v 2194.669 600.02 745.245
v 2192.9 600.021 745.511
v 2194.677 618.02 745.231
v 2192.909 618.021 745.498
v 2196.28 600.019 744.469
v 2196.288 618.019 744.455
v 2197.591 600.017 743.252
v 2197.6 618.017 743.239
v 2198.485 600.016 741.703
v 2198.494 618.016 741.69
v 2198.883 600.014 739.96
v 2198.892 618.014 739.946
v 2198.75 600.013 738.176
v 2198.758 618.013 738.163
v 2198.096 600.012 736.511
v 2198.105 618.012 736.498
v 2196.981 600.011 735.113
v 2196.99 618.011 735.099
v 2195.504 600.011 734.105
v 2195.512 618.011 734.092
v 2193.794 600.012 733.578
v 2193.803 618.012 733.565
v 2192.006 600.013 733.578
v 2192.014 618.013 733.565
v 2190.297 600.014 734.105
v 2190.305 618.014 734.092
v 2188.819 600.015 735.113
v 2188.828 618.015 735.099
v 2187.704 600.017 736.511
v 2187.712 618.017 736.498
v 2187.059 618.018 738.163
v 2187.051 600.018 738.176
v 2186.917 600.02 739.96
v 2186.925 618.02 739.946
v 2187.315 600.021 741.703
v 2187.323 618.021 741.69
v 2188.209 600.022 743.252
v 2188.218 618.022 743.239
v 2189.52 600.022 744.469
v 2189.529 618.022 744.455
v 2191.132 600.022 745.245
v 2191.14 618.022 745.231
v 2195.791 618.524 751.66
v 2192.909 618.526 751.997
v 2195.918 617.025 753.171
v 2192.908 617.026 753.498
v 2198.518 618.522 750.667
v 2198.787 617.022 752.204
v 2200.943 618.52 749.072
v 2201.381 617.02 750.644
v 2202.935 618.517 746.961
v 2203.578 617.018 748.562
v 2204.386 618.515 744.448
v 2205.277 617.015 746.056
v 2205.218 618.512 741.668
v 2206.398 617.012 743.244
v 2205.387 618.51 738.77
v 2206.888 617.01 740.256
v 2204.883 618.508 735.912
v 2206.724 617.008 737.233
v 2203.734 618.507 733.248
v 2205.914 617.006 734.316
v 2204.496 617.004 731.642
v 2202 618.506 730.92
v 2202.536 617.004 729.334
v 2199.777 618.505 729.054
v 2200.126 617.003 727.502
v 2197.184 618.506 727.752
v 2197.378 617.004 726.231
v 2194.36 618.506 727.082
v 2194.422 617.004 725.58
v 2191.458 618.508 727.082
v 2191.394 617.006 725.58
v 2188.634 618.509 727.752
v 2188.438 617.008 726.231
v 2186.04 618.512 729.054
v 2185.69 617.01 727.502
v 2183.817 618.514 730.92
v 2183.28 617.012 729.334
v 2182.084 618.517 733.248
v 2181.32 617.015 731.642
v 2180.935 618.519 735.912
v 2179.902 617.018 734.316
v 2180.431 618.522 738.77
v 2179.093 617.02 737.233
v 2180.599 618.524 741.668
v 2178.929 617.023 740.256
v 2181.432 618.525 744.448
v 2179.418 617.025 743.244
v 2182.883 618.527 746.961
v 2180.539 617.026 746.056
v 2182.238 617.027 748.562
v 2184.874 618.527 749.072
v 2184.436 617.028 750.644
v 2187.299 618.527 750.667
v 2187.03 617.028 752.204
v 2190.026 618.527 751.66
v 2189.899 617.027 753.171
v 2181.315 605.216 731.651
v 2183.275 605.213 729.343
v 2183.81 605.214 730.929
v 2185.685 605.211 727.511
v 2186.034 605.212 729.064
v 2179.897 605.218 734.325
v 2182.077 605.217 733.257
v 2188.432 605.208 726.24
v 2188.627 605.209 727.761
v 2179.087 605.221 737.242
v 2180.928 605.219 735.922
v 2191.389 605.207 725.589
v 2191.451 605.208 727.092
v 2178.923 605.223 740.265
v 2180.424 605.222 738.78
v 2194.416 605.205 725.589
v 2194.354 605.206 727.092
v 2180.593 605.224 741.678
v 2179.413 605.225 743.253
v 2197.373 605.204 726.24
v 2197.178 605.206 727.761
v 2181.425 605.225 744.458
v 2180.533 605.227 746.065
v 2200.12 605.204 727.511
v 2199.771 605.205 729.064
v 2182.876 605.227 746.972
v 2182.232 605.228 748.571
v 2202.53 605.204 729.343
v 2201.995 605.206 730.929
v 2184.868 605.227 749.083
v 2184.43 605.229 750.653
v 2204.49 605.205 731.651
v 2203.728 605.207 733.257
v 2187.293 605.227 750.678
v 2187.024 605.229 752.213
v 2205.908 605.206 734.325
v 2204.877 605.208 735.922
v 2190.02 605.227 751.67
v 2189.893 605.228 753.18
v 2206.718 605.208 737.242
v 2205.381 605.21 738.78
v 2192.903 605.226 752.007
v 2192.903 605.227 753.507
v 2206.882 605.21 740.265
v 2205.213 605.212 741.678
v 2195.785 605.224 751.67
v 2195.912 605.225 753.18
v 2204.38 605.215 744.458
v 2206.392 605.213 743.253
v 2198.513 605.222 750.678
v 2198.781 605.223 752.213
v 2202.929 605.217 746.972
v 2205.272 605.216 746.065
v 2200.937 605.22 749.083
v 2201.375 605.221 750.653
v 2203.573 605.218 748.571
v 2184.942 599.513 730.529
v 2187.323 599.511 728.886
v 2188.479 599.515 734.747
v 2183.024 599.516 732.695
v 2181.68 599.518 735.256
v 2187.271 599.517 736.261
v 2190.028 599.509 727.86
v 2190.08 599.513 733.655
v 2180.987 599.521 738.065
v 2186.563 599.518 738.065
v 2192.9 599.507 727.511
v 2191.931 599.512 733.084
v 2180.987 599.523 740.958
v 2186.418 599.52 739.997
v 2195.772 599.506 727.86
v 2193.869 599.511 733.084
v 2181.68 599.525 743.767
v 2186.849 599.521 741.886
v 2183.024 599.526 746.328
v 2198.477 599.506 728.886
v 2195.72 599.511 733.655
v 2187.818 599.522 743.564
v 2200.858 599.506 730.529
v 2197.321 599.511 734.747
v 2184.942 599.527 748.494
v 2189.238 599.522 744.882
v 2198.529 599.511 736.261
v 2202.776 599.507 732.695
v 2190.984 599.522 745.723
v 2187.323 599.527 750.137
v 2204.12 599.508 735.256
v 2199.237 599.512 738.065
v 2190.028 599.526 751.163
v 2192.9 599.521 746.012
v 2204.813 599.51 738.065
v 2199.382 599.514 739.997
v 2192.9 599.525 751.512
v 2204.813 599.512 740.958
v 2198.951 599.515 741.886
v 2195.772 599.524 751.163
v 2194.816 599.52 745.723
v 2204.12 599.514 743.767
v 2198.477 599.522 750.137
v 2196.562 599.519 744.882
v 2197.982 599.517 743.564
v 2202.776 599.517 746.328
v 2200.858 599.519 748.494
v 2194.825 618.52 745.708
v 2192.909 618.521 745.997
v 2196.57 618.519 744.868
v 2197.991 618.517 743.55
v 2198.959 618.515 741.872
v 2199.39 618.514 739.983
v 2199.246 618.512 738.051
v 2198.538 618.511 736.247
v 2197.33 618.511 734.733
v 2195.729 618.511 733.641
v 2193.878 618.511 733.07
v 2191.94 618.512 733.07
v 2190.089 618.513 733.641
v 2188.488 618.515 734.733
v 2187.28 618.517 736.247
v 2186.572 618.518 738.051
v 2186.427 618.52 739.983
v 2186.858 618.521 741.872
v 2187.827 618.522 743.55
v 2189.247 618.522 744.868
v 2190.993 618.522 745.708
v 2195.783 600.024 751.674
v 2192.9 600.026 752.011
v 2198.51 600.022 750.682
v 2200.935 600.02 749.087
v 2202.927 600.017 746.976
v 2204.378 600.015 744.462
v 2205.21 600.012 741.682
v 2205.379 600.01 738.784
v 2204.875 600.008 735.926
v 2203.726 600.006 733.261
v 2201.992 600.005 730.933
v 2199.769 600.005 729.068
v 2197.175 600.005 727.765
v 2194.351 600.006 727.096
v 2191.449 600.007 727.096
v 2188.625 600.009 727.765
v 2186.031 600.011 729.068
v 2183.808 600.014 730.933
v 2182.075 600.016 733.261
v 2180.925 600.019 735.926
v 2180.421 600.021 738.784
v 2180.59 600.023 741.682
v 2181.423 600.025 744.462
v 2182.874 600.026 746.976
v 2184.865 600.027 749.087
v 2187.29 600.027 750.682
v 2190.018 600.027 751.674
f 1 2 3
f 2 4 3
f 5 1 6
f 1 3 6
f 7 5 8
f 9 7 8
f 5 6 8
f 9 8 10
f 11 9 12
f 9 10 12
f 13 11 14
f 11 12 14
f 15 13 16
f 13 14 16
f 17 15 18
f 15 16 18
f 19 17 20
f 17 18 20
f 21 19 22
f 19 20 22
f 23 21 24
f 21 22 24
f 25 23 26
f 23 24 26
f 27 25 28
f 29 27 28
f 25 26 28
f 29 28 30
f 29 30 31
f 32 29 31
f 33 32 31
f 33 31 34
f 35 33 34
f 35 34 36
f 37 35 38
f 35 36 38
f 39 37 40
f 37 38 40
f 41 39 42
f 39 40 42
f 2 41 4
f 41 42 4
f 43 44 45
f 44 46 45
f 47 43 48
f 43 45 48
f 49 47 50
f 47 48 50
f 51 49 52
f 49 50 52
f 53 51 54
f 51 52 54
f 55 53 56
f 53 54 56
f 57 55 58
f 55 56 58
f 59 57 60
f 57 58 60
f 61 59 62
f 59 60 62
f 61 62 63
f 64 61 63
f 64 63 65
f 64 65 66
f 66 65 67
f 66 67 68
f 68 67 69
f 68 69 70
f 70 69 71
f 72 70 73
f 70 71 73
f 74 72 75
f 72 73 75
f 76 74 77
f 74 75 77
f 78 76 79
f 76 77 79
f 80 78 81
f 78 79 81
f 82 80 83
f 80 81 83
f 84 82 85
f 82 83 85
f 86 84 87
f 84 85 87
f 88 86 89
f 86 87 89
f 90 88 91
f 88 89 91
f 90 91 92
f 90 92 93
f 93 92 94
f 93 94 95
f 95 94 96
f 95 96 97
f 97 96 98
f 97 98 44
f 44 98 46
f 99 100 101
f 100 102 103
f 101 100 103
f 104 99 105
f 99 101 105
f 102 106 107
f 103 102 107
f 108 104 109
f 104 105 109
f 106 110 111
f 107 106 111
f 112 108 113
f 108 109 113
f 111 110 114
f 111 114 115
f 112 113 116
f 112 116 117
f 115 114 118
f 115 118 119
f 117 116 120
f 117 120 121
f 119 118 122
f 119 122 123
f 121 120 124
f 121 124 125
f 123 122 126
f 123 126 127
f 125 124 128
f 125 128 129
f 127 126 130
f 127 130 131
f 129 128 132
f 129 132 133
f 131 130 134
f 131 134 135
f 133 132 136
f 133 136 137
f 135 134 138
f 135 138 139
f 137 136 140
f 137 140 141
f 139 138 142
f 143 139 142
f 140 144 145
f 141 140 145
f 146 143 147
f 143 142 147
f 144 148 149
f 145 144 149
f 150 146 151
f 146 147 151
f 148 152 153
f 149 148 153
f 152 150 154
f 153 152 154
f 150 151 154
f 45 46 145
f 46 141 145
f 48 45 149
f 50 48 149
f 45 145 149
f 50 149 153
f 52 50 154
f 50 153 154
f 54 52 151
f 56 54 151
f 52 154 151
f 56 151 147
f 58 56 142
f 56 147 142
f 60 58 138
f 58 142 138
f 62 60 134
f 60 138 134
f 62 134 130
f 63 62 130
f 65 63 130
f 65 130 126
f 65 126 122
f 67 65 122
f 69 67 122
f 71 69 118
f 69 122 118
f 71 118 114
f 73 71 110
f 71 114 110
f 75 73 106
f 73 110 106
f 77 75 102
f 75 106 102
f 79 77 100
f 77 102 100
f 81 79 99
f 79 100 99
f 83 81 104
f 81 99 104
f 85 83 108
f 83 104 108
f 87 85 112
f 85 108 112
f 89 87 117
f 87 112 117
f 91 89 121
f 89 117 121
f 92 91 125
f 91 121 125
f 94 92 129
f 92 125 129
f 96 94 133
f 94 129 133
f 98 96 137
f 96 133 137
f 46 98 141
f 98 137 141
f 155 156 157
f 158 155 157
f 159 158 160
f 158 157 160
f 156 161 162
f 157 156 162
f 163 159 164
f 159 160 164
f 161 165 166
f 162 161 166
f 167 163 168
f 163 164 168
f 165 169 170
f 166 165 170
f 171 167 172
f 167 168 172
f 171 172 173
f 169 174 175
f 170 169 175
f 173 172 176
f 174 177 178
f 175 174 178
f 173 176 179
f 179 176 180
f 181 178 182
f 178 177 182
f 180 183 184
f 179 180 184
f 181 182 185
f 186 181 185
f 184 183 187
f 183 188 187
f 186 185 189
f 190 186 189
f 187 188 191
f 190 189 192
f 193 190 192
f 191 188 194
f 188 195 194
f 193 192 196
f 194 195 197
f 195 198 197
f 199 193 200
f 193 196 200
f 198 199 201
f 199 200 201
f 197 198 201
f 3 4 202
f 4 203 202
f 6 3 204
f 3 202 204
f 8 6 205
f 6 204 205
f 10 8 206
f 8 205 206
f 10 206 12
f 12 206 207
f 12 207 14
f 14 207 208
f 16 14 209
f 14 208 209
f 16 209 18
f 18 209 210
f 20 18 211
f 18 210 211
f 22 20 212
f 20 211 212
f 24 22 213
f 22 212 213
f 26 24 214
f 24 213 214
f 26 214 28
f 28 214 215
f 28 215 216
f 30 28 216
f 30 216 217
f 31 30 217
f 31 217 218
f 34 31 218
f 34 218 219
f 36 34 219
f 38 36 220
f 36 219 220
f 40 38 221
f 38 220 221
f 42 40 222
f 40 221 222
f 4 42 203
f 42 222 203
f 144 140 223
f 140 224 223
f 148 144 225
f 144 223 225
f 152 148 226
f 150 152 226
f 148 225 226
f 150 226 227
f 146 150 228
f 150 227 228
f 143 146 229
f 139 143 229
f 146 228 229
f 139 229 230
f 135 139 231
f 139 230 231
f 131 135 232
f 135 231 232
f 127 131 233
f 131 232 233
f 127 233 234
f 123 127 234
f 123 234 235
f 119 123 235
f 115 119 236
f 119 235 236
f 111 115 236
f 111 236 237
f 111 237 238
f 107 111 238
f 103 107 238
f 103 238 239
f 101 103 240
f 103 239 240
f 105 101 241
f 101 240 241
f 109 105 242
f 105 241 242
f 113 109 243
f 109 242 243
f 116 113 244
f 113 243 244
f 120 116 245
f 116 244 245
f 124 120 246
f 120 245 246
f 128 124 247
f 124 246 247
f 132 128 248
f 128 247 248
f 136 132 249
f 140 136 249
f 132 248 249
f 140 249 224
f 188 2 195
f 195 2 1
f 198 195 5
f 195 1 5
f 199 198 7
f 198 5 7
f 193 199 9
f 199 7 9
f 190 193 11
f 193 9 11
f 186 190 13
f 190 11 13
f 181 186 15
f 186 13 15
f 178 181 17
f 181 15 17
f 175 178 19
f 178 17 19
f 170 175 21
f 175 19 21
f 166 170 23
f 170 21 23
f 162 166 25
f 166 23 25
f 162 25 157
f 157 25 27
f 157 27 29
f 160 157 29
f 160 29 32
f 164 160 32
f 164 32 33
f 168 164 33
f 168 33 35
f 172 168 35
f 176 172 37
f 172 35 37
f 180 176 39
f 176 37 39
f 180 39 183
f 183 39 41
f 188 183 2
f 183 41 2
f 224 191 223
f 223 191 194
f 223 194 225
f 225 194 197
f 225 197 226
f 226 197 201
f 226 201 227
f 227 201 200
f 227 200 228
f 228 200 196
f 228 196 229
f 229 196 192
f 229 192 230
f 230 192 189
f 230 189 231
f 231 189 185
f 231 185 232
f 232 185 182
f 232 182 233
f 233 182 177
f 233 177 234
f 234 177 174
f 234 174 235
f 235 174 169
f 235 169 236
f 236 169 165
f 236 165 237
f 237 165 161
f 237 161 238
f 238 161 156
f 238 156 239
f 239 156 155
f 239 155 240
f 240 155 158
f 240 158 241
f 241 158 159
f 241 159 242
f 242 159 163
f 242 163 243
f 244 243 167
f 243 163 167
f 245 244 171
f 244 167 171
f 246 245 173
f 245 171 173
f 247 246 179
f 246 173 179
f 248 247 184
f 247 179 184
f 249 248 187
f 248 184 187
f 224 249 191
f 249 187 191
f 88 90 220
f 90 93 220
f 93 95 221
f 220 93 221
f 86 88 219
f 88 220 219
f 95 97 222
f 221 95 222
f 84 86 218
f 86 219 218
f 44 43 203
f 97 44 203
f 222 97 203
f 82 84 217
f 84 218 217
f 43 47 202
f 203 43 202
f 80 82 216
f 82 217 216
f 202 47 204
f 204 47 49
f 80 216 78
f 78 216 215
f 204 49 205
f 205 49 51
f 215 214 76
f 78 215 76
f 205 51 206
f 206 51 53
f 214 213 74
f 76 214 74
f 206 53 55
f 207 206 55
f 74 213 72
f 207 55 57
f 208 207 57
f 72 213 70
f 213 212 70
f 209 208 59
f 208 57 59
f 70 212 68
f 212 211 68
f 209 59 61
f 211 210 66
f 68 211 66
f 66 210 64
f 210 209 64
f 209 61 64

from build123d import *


with BuildPart() as part:
    # Esquisse1 → Base-Révolution (revolve)
    with BuildSketch(Plane(origin=(0, 0.557099225, 739.962502514), x_dir=(-1, 0, 0), z_dir=(0, -0.0007528747265126423, -0.9999997165897829)), mode=Mode.PRIVATE) as base_r_volution_sk:
        Polygon((-2199.400204284, 598.95640538), (-2198.900204284, 599.456870076), (-2198.908564931, 617.456867811), (-2199.408564931, 617.956403546), (-2205.408099158, 617.95361688), (-2206.908099158, 616.452222791), (-2206.902618614, 604.65292127), (-2205.402618773, 604.653617991), (-2205.400203367, 599.453386473), (-2204.900203367, 598.953850738), align=None)
    revolve(base_r_volution_sk.sketch.rotate(Axis((2192.899970054, 599.510903709, 739.511565204), (0.0004644803890833411, 0.9999996087187918, -0.0007528746453008684)), 270), axis=Axis((2192.899970054, 599.510903709, 739.511565204), (0.0004644803890833411, 0.9999996087187918, -0.0007528746453008684)))


solid = part.part
